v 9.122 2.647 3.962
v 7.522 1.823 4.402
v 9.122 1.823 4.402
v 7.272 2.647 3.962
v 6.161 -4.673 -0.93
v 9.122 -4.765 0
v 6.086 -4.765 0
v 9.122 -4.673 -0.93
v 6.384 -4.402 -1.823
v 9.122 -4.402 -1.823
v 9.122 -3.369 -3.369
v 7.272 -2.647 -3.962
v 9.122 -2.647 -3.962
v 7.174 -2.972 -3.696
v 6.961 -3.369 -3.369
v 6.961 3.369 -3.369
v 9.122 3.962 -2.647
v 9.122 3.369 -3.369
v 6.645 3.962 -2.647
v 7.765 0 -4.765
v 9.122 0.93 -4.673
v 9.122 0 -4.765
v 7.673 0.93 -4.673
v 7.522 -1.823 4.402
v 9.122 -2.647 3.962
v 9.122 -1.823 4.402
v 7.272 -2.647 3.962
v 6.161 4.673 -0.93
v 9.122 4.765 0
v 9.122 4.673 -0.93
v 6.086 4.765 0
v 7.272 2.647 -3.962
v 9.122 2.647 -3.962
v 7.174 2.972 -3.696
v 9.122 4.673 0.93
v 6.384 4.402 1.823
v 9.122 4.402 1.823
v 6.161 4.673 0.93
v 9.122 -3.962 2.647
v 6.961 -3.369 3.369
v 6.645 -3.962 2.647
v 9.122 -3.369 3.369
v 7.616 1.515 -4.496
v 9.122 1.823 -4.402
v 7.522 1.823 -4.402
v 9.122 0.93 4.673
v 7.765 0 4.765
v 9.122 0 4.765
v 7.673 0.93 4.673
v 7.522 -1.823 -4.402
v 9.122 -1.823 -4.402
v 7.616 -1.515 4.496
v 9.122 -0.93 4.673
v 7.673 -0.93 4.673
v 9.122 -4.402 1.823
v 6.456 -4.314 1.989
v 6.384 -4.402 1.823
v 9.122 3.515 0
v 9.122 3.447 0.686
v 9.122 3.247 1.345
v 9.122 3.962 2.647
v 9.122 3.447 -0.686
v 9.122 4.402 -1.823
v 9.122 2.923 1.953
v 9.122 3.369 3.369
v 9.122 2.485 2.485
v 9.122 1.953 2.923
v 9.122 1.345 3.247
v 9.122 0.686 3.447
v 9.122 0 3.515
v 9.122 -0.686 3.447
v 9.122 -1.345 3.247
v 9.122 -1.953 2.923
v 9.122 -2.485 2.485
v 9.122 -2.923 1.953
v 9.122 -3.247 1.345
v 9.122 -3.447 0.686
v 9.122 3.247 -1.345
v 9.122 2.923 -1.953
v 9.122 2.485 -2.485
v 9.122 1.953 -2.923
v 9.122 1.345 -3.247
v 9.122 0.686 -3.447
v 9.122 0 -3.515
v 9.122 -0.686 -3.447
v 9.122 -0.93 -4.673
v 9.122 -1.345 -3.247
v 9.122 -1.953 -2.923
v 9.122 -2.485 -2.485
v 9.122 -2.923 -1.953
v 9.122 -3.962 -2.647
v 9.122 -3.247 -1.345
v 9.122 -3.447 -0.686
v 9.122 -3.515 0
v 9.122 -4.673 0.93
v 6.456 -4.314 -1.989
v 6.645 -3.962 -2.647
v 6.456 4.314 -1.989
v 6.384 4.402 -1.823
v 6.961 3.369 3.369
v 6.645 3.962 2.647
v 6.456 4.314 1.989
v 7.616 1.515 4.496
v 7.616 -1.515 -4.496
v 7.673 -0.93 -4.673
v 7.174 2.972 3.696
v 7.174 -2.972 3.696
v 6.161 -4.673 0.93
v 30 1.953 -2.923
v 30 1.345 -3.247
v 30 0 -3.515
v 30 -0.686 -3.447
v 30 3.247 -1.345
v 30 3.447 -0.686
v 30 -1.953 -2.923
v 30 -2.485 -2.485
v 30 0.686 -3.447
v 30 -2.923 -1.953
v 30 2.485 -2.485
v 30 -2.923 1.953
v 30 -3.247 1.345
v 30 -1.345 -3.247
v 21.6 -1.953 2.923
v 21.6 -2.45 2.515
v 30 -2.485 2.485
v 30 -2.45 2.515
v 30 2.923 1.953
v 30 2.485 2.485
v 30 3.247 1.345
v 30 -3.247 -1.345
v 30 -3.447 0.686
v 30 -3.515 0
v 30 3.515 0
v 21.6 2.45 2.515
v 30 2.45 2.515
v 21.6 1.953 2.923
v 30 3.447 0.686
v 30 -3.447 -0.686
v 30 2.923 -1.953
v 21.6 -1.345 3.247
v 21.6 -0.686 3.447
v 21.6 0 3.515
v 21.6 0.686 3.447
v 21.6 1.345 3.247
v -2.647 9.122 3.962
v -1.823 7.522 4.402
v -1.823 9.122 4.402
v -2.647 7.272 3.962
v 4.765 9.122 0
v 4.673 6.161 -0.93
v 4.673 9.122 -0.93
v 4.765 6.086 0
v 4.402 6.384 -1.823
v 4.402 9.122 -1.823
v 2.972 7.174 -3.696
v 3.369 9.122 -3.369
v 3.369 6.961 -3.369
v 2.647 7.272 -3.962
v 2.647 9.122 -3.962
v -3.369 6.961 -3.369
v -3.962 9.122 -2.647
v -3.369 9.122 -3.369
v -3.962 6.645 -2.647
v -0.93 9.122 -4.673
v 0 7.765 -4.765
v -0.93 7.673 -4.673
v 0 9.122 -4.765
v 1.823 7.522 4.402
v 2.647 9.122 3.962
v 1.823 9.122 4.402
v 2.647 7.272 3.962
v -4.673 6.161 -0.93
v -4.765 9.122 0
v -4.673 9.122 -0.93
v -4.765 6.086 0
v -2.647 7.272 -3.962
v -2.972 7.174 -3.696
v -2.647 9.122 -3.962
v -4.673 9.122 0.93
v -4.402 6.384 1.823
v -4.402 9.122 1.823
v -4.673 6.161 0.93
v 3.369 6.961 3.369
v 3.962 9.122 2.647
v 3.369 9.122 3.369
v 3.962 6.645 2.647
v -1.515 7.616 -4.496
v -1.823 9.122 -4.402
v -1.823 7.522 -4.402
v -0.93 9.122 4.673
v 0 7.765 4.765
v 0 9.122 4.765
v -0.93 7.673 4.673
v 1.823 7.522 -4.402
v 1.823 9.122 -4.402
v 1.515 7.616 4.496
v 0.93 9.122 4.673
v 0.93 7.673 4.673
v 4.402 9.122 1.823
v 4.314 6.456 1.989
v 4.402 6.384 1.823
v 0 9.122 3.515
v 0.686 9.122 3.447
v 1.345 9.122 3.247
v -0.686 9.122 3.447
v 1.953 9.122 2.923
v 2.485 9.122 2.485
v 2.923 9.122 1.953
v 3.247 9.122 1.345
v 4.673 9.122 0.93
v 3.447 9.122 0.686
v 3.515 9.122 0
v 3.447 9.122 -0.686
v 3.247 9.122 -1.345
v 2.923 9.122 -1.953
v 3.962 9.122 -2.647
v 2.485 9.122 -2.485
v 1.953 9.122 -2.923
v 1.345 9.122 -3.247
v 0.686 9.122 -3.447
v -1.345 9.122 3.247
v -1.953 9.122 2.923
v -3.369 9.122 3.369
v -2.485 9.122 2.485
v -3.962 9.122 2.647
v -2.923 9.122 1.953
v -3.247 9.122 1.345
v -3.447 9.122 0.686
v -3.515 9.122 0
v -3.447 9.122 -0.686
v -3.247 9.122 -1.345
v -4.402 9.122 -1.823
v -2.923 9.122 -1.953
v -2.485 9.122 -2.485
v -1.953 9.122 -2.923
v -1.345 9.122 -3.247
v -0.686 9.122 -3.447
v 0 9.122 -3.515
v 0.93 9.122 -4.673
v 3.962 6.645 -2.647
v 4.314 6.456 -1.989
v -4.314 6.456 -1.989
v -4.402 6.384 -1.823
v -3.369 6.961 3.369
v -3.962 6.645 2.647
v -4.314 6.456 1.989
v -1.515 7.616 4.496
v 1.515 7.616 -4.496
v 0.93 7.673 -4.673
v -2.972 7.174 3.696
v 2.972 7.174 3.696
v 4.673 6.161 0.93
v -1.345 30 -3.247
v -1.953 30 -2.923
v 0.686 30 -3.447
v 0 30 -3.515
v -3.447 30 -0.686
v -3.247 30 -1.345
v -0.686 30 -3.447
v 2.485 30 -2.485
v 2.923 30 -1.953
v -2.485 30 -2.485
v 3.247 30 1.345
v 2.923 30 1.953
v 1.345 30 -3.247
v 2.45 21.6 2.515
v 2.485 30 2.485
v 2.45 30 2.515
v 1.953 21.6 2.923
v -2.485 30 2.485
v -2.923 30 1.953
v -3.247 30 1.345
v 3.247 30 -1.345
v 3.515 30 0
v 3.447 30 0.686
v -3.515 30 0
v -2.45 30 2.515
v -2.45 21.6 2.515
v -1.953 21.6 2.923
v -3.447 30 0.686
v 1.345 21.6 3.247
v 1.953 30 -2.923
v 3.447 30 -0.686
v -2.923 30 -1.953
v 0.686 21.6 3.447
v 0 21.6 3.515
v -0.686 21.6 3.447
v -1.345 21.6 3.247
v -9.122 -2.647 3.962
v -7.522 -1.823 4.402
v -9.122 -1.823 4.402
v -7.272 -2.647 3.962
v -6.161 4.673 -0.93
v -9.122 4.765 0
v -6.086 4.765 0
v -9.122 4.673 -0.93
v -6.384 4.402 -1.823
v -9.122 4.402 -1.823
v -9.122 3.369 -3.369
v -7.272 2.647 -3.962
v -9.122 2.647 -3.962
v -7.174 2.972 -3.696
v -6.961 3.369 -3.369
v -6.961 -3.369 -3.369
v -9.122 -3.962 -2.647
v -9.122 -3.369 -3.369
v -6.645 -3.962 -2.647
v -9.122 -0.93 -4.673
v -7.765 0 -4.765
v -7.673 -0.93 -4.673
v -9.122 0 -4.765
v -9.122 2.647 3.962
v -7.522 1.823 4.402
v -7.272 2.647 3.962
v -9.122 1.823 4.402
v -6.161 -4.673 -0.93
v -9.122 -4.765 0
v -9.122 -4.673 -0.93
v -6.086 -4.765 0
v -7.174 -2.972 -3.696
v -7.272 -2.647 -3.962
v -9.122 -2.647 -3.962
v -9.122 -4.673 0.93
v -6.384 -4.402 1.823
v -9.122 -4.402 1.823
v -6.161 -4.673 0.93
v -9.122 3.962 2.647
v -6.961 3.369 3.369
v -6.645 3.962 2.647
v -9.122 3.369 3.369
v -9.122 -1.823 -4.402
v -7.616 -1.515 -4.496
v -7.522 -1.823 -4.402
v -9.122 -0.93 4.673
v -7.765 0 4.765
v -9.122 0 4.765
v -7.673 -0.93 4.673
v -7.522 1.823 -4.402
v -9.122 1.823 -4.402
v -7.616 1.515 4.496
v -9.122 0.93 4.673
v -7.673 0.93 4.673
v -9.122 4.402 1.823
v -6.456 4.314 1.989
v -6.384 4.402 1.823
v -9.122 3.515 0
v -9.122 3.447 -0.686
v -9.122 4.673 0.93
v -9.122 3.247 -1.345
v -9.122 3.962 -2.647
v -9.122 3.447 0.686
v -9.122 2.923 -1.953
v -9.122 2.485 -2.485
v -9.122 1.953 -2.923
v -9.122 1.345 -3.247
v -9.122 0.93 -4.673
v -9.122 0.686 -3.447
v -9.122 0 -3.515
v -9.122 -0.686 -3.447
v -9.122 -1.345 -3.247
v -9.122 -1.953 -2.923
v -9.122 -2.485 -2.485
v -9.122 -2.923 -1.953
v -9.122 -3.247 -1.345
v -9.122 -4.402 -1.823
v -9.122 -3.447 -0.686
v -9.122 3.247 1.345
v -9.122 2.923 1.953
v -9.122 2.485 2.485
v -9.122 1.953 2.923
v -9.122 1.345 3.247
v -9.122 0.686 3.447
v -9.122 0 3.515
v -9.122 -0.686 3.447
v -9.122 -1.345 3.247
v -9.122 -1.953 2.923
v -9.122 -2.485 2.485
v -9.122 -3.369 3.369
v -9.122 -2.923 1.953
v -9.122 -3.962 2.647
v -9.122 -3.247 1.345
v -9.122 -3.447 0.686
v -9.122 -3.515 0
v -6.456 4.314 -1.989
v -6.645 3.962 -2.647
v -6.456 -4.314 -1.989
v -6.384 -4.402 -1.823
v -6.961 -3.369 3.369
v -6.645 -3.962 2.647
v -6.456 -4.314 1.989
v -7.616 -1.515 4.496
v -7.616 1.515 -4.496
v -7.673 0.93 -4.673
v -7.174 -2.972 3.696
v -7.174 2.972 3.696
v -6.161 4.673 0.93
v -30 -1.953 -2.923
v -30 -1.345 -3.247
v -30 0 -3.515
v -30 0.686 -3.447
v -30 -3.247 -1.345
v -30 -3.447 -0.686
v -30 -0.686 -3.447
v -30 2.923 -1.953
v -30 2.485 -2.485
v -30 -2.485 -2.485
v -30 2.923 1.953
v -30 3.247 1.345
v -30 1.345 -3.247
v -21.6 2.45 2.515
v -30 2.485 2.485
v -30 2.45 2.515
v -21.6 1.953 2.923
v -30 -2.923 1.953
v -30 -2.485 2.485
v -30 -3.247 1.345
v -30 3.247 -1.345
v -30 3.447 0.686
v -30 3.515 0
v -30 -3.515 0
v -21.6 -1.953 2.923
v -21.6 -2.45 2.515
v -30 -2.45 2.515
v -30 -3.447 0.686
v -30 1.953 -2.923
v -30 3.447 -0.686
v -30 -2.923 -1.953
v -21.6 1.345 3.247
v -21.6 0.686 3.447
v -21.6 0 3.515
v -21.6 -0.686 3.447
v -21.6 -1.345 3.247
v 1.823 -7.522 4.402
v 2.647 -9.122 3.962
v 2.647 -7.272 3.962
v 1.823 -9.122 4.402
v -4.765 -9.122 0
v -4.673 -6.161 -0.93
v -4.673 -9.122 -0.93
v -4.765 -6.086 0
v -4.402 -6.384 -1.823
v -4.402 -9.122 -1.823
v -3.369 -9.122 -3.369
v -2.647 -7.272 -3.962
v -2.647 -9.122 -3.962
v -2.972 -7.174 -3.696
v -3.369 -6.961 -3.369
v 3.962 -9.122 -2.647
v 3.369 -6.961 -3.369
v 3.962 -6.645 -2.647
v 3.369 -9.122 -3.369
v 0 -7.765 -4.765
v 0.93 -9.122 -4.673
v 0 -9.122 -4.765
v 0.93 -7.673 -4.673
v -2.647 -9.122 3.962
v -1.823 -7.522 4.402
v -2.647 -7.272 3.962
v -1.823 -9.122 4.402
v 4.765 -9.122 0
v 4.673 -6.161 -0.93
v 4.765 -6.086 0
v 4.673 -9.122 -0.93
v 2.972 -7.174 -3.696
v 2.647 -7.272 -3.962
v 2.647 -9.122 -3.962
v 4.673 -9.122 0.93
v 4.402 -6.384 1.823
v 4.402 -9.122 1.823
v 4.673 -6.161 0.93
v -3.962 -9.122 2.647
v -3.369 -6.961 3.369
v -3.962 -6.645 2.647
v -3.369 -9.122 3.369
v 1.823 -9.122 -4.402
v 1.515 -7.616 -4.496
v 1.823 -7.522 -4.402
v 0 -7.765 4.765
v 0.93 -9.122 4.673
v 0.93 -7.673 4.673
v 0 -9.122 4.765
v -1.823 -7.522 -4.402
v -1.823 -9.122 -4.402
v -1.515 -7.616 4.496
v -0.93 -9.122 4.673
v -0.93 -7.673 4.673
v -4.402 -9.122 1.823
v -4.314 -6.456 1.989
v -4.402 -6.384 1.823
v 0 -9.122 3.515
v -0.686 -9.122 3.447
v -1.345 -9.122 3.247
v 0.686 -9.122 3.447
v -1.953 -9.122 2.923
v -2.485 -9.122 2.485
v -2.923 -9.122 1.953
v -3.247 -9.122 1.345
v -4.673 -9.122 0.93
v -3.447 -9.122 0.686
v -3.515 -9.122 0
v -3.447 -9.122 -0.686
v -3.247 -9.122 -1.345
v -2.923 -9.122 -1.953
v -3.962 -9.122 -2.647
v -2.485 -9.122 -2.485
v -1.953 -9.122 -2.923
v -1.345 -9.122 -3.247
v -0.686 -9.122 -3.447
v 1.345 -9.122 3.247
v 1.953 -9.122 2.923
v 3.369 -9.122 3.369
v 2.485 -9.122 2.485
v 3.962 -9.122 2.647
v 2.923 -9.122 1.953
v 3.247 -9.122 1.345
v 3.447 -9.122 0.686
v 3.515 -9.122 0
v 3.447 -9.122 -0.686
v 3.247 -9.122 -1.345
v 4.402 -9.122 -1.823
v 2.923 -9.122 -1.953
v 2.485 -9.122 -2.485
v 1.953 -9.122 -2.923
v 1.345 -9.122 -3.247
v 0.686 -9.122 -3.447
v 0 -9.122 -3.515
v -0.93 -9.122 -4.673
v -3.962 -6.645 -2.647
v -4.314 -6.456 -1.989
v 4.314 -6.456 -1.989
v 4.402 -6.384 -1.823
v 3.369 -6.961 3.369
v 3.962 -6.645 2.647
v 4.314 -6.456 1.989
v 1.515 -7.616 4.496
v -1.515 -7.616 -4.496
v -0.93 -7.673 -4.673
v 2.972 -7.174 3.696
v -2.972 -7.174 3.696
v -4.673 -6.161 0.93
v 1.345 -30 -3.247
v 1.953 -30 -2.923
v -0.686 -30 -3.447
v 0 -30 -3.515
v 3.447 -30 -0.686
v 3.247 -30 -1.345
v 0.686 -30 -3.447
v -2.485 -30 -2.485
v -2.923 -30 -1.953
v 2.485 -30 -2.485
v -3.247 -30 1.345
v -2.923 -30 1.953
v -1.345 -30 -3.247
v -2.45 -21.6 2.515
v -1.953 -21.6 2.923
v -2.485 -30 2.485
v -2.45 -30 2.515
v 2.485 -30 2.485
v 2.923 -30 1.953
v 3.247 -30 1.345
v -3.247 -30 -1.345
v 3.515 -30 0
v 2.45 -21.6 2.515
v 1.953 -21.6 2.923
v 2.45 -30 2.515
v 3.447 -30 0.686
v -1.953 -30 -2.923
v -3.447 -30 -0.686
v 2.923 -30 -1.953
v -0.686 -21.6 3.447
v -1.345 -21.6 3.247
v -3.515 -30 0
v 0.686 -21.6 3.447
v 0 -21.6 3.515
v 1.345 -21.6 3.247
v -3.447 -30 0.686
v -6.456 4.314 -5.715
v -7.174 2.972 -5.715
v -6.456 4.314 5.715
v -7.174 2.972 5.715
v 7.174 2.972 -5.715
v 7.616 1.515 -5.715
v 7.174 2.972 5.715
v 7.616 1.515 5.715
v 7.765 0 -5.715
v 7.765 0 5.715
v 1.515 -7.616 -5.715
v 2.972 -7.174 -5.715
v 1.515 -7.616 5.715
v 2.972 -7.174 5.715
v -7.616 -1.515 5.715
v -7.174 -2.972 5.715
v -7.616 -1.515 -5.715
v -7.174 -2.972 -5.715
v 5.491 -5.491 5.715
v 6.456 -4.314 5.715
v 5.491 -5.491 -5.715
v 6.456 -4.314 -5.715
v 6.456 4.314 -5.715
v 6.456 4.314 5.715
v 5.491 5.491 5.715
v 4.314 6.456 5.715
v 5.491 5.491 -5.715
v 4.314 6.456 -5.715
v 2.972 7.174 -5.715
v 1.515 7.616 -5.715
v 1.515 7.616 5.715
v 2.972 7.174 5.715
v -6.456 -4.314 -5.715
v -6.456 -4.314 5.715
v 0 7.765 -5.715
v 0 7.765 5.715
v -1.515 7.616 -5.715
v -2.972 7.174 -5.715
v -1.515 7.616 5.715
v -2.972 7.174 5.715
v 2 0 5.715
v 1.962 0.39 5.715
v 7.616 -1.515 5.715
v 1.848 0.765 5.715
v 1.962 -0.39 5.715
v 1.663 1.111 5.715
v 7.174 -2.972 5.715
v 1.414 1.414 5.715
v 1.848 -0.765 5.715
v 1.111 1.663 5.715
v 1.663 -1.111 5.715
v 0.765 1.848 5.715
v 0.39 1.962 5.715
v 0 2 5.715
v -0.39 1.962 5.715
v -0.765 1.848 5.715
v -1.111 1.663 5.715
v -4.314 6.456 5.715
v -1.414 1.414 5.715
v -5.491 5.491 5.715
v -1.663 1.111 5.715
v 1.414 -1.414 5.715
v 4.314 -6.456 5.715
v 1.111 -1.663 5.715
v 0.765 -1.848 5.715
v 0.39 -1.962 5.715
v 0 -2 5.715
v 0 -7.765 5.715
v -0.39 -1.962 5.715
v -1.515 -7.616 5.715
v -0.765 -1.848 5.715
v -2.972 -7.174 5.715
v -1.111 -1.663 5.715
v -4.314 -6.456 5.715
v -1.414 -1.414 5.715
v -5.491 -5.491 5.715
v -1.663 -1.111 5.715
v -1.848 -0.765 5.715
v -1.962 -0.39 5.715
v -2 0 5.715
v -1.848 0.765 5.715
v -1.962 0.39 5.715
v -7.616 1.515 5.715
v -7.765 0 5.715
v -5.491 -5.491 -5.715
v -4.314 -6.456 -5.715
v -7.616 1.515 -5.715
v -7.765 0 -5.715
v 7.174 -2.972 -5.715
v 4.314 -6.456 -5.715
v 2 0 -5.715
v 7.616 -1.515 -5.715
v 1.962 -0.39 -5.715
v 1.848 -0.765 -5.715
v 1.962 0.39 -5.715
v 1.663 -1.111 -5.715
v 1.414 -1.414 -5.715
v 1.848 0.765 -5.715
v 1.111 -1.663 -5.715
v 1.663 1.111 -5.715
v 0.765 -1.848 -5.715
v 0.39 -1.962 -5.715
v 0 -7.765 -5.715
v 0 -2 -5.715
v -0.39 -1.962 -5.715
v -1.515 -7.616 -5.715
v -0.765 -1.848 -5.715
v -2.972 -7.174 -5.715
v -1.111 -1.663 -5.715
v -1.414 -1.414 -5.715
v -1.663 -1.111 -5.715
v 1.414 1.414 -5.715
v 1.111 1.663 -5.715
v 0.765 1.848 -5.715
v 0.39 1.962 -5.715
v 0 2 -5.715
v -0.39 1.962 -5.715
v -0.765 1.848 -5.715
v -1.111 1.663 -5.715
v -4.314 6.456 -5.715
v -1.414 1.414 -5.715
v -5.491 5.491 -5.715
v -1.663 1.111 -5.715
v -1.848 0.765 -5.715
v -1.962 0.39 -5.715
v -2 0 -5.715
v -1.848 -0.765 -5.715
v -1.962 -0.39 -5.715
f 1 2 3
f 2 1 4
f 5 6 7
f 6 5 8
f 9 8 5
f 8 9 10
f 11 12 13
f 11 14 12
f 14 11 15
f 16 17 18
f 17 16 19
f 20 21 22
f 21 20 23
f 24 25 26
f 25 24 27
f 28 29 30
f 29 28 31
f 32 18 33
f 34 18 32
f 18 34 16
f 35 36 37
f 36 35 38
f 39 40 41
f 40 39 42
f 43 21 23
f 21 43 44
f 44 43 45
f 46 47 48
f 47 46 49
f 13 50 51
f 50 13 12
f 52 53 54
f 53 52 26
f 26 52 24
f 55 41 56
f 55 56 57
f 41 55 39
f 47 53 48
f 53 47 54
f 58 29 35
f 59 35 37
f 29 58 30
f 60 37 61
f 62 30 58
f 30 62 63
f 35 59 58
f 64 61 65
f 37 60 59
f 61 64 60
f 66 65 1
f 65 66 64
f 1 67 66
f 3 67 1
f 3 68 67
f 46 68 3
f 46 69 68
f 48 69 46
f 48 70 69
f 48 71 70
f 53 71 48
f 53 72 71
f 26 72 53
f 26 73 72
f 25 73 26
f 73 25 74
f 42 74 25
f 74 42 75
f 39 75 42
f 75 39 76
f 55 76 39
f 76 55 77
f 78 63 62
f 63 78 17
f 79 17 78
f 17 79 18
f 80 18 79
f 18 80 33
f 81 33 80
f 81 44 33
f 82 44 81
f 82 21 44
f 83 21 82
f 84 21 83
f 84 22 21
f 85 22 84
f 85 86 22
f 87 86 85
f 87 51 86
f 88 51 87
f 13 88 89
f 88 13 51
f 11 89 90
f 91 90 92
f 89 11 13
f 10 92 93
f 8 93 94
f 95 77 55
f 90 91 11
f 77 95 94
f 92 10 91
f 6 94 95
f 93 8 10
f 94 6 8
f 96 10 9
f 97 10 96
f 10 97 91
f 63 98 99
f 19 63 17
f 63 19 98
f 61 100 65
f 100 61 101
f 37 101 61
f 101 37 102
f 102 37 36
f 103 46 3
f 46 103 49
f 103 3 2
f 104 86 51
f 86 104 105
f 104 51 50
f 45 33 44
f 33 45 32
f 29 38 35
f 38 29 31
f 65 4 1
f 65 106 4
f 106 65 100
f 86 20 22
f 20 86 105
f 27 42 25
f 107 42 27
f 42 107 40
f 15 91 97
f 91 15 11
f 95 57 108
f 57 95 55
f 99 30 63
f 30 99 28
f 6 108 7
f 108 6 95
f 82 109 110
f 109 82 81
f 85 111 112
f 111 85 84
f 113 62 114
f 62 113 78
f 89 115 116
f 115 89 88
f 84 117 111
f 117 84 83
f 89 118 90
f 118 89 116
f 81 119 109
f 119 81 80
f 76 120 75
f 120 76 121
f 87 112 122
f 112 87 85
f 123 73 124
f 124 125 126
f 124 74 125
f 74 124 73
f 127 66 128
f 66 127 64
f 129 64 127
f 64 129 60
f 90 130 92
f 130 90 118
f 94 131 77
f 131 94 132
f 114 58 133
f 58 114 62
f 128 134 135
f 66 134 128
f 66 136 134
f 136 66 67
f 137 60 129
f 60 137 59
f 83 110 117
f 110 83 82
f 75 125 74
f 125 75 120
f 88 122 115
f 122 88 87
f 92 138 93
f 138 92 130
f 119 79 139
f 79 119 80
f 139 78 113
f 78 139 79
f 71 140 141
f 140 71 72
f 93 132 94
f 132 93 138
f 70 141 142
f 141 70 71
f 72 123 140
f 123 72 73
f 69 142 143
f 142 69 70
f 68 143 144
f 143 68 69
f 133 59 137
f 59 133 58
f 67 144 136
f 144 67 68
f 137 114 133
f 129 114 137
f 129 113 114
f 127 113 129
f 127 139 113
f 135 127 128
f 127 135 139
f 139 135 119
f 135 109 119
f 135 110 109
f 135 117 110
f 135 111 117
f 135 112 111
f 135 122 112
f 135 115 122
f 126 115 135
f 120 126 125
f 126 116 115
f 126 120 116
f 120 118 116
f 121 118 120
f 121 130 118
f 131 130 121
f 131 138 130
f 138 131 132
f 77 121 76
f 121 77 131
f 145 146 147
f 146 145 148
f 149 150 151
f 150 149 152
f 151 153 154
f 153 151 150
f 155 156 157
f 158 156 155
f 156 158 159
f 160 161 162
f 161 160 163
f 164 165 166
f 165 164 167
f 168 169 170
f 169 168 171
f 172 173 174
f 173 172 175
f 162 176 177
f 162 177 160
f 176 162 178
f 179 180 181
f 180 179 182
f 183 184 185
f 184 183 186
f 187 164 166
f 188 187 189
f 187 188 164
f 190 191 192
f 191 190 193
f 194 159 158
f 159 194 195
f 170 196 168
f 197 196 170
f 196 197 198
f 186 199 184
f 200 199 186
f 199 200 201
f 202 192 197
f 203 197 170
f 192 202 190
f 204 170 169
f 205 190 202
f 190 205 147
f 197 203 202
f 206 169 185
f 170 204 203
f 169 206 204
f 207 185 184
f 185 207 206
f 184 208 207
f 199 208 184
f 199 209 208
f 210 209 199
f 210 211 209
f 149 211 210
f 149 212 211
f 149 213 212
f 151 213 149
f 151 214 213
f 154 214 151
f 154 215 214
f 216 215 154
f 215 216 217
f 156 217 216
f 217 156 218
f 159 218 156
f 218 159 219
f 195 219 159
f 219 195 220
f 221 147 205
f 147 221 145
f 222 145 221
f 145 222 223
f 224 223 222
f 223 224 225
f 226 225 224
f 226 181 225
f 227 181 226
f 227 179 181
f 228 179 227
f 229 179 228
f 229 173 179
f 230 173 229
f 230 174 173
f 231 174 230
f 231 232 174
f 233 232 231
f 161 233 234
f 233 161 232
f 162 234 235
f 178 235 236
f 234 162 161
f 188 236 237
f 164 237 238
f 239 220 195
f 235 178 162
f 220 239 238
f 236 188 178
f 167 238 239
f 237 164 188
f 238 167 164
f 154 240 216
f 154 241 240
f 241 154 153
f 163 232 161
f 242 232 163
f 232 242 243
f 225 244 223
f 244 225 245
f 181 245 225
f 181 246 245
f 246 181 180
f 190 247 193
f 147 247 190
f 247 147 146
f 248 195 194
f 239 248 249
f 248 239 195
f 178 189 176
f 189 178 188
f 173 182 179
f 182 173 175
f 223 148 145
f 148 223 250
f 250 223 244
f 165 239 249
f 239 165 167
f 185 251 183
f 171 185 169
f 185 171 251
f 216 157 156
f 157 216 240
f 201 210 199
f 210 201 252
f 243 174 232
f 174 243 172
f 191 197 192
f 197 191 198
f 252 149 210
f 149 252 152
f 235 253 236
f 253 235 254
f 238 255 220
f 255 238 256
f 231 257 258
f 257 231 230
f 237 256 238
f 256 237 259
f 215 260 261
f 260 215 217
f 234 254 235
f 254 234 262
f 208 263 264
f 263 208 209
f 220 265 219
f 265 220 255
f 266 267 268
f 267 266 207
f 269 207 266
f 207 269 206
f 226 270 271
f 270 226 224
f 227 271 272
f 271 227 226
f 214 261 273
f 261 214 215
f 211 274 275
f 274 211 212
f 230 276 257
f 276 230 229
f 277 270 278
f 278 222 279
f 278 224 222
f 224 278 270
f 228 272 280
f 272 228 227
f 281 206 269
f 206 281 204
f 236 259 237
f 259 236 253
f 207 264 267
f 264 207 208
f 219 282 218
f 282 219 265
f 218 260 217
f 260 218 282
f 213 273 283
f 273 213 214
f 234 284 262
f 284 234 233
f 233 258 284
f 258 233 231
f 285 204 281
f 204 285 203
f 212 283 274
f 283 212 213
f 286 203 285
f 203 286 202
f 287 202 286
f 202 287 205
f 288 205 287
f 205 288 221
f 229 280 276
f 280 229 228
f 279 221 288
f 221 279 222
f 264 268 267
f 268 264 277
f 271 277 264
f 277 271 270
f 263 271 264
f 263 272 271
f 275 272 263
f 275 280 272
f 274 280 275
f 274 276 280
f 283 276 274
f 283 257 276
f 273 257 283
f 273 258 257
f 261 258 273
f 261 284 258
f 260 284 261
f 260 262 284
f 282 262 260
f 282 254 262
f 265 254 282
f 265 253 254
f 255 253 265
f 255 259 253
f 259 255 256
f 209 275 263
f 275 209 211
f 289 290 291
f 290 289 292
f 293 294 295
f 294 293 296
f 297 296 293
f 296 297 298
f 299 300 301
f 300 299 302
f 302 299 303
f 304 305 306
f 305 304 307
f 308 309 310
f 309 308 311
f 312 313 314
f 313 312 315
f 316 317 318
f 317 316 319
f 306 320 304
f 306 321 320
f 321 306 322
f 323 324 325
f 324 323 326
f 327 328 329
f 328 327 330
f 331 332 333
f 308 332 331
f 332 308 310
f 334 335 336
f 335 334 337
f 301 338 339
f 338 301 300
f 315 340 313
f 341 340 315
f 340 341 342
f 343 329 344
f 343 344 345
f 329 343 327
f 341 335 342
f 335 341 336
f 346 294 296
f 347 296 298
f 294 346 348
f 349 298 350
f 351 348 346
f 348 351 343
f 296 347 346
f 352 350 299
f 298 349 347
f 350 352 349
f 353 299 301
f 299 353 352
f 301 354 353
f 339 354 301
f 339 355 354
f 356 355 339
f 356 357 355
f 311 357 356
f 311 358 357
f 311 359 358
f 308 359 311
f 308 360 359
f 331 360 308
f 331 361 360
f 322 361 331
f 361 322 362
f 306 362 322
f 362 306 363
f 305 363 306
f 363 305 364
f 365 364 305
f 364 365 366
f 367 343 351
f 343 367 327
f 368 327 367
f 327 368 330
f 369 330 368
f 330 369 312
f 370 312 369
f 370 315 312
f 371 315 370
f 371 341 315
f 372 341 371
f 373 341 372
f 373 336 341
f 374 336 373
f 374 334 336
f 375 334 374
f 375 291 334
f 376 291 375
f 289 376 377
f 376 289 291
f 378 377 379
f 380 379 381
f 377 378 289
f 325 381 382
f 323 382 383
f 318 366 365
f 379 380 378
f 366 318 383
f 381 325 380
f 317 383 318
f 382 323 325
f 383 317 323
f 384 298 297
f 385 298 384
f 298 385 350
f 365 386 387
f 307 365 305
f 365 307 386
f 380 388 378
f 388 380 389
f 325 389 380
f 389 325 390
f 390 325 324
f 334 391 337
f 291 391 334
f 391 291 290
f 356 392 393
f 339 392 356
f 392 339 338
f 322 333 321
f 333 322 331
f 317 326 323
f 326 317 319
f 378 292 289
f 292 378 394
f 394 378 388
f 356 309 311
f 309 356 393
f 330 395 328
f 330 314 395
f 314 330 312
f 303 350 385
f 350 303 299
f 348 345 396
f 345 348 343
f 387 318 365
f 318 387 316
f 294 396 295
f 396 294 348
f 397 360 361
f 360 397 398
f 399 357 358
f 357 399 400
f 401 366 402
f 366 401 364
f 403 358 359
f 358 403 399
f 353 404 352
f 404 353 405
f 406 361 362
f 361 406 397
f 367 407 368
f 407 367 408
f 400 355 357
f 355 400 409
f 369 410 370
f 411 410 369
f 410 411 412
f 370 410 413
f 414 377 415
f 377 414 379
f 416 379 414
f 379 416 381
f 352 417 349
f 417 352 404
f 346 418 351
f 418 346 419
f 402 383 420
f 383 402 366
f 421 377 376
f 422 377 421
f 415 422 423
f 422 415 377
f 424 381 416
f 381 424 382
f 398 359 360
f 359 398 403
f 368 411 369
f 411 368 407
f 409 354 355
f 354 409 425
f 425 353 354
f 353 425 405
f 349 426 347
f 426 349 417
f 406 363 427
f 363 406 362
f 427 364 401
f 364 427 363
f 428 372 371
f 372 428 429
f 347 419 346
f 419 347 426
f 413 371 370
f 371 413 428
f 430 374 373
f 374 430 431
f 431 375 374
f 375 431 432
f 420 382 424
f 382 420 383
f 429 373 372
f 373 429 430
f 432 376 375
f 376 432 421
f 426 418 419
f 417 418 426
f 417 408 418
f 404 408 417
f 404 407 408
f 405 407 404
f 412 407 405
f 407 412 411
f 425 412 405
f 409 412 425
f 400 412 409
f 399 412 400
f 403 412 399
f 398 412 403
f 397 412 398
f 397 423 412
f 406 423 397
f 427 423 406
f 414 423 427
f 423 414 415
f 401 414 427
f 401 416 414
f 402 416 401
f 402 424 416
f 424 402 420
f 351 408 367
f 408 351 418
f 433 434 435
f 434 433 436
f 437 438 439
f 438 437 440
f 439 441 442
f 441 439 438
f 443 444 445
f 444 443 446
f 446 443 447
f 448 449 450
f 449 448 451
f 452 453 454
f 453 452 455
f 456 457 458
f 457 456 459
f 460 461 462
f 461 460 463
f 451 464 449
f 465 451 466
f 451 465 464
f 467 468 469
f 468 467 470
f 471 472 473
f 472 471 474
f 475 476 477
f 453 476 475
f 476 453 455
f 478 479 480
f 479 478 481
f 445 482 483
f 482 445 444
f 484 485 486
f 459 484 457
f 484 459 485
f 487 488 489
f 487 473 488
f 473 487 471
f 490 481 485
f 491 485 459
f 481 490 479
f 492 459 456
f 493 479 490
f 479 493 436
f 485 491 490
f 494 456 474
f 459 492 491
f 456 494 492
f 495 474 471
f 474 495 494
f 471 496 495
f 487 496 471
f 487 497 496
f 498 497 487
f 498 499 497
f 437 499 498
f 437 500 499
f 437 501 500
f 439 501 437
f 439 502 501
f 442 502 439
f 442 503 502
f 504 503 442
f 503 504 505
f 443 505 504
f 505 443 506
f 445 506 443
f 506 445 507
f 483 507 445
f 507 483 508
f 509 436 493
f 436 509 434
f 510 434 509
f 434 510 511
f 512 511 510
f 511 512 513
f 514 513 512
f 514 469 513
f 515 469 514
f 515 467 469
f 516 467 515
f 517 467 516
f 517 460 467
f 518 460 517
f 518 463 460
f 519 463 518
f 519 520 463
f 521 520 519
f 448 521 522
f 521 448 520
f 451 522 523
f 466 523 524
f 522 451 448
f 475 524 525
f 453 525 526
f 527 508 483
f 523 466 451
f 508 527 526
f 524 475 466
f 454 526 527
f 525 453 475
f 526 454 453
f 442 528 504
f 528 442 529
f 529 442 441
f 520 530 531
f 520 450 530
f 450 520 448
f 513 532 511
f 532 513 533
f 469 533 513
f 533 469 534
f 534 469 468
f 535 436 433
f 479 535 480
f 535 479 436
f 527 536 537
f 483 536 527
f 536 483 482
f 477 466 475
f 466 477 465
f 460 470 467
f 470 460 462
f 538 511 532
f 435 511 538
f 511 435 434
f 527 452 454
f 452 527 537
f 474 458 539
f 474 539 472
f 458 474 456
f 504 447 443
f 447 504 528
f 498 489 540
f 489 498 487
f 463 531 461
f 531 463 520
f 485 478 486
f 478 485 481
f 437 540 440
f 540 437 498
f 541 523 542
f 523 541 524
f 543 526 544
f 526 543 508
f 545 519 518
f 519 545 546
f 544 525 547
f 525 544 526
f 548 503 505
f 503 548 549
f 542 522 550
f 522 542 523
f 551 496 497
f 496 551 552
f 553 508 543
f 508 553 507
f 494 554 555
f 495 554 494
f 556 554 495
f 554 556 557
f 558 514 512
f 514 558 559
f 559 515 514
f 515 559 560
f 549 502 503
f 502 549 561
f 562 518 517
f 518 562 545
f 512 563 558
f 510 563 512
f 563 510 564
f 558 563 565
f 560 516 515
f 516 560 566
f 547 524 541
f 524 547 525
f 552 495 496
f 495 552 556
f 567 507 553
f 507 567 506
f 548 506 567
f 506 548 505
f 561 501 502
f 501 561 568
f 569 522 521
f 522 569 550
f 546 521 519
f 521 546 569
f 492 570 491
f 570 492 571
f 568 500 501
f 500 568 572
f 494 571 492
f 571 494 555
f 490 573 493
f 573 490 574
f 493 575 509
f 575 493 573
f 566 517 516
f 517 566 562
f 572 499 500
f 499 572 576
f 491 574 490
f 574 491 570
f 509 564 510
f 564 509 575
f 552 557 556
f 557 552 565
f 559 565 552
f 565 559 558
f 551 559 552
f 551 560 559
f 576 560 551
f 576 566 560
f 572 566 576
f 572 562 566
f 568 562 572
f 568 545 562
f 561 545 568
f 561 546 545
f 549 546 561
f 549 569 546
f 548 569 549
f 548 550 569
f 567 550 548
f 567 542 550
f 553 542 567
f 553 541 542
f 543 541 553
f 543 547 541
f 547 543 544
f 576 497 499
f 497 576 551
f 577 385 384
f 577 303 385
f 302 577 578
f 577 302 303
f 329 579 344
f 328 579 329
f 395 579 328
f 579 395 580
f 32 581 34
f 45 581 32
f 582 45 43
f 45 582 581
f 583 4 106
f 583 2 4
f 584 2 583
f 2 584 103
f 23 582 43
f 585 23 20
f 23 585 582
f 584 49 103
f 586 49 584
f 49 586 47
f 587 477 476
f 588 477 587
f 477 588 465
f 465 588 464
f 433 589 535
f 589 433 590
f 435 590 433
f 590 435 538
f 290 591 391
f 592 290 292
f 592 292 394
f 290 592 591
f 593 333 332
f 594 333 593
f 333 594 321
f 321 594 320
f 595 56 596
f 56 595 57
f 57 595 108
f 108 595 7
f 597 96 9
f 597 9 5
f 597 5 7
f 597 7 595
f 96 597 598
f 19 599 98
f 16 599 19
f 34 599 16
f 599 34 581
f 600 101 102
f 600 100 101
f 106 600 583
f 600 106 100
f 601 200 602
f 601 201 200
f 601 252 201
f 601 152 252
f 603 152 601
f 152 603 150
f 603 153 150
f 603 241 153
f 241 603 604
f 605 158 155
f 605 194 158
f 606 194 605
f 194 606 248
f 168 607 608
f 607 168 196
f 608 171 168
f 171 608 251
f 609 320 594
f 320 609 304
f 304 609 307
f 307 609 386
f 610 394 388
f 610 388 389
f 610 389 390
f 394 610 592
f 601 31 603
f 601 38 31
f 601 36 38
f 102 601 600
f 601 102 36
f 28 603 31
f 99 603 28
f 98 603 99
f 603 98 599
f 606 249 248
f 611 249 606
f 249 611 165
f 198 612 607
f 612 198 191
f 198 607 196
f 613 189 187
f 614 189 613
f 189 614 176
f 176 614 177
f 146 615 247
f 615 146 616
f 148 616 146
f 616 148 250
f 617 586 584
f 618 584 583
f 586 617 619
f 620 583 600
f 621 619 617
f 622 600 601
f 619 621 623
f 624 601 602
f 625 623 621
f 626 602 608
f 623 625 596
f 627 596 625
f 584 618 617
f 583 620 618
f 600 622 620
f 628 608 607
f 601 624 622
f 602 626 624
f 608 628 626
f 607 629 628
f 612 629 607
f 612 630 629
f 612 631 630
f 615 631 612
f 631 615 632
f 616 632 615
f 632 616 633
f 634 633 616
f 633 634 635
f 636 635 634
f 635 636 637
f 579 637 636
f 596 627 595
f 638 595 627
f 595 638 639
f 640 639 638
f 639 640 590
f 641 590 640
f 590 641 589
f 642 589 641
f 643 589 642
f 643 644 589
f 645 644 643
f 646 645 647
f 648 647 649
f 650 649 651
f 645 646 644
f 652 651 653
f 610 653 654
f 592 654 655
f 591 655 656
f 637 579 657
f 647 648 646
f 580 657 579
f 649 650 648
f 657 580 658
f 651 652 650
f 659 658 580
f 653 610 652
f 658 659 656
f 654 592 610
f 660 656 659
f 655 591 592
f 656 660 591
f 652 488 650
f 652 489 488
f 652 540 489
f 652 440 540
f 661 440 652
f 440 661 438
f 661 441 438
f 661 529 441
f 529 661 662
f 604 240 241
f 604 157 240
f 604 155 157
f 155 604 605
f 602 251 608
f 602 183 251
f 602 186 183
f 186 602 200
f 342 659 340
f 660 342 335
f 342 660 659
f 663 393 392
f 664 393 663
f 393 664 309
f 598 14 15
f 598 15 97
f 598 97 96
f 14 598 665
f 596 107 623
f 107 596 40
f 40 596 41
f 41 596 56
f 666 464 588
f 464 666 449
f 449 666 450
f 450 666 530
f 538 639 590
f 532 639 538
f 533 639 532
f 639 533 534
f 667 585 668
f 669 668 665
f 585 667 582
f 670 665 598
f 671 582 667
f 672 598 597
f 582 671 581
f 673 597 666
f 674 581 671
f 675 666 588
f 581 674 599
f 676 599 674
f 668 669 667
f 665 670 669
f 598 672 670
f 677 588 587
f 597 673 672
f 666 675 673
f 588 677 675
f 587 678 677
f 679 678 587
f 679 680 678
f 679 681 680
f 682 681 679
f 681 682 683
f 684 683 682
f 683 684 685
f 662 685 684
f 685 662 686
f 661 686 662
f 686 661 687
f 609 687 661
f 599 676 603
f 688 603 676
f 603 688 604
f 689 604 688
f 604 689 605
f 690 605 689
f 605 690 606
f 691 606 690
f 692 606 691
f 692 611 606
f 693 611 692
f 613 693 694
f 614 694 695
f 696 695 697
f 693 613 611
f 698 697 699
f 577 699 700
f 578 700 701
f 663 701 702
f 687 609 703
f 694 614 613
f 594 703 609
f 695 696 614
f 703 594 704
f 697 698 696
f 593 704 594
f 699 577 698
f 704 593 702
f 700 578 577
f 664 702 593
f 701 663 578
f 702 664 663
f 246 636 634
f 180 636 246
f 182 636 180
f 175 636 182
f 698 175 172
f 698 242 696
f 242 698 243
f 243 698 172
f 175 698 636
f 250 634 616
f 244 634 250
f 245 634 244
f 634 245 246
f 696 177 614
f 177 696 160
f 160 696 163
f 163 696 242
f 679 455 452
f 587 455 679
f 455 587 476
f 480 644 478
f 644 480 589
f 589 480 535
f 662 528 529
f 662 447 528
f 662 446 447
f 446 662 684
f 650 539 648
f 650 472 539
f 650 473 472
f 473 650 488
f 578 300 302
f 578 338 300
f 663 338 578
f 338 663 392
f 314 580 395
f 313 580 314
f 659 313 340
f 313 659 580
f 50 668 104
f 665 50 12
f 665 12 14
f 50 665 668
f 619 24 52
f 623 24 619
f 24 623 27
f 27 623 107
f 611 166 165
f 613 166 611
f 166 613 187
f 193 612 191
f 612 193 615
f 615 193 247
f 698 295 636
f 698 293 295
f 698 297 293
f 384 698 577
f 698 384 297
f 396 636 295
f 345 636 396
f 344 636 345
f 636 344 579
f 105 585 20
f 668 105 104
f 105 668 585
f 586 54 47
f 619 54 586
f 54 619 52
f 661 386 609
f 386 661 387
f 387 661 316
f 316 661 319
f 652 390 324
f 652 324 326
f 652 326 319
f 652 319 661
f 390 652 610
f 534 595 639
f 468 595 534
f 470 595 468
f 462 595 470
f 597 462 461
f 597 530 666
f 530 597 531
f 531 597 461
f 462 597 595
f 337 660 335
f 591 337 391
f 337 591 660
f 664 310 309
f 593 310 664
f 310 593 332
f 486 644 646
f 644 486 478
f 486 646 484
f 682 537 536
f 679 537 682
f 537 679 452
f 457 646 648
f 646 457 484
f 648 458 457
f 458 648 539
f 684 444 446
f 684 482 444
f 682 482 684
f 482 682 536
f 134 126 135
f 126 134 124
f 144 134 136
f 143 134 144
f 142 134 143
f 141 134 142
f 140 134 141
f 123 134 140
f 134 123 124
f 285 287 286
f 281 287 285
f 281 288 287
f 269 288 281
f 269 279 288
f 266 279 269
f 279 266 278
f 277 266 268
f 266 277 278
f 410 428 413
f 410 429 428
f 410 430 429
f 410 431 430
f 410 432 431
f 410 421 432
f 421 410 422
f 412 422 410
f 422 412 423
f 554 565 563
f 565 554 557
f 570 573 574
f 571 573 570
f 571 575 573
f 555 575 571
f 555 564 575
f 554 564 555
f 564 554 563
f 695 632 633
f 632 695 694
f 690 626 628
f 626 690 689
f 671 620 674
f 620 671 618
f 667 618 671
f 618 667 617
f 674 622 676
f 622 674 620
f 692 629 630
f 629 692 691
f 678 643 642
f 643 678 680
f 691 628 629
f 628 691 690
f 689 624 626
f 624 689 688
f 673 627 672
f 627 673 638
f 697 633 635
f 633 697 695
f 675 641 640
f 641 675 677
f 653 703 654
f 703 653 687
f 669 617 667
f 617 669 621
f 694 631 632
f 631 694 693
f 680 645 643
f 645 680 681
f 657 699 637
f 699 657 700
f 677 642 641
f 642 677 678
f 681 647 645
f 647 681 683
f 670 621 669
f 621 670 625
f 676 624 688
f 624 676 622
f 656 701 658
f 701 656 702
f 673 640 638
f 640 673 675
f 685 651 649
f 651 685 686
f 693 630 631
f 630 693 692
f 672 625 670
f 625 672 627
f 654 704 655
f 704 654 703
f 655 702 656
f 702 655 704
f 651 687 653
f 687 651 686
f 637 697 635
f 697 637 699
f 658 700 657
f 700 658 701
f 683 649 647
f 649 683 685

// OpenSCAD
$fn = 32;

// ----------------------------------------------------------------------
// Cardan cross: 60 mm span, 9.53 mm trunnions
// ----------------------------------------------------------------------

// --- parameters (mm) ---
journal_d = 9.53;         // trunnion diameter
arm_len = 30;             // trunnion length from the centre
step_r = 3.24;            // step position from the centre
step_d = 7.03;            // journal diameter after the step
hub_d = 15.53;            // hub diameter
hub_h = 11.43;            // hub height
bore_d = 4;               // hub bore
flat_d = 1;               // depth of the journal flat
flat_len = 8.4;           // length of the journal flat

difference() {
  union() {
    /* hub along the joint axis */
    cylinder(h = hub_h, d = hub_d, center = true);
    for (a = [0 : 90 : 270]) rotate([0, 0, a]) {
      /* trunnion, sunk into the hub */
      translate([hub_d / 4, 0, 0]) rotate([0, 90, 0]) cylinder(h = step_r + 2, d = journal_d);
      /* stepped journal out to the tip */
      translate([step_r - 0.5, 0, 0]) rotate([0, 90, 0]) cylinder(h = arm_len + 0.5 - step_r, d = step_d);
    }
  }
  /* lubrication bore through the hub, 2.5 mm clear on both sides */
  translate([0, 0, -hub_h / 2 - 2.5]) cylinder(h = hub_h + 5, d = bore_d);
  /* machined flat on each journal tip */
  for (a = [0 : 90 : 270]) rotate([0, 0, a]) {
    translate([arm_len - flat_len, -step_d, step_d / 2 - flat_d]) cube([flat_len + 0.5, 2 * step_d, flat_d + 2.5]);
  }
}
